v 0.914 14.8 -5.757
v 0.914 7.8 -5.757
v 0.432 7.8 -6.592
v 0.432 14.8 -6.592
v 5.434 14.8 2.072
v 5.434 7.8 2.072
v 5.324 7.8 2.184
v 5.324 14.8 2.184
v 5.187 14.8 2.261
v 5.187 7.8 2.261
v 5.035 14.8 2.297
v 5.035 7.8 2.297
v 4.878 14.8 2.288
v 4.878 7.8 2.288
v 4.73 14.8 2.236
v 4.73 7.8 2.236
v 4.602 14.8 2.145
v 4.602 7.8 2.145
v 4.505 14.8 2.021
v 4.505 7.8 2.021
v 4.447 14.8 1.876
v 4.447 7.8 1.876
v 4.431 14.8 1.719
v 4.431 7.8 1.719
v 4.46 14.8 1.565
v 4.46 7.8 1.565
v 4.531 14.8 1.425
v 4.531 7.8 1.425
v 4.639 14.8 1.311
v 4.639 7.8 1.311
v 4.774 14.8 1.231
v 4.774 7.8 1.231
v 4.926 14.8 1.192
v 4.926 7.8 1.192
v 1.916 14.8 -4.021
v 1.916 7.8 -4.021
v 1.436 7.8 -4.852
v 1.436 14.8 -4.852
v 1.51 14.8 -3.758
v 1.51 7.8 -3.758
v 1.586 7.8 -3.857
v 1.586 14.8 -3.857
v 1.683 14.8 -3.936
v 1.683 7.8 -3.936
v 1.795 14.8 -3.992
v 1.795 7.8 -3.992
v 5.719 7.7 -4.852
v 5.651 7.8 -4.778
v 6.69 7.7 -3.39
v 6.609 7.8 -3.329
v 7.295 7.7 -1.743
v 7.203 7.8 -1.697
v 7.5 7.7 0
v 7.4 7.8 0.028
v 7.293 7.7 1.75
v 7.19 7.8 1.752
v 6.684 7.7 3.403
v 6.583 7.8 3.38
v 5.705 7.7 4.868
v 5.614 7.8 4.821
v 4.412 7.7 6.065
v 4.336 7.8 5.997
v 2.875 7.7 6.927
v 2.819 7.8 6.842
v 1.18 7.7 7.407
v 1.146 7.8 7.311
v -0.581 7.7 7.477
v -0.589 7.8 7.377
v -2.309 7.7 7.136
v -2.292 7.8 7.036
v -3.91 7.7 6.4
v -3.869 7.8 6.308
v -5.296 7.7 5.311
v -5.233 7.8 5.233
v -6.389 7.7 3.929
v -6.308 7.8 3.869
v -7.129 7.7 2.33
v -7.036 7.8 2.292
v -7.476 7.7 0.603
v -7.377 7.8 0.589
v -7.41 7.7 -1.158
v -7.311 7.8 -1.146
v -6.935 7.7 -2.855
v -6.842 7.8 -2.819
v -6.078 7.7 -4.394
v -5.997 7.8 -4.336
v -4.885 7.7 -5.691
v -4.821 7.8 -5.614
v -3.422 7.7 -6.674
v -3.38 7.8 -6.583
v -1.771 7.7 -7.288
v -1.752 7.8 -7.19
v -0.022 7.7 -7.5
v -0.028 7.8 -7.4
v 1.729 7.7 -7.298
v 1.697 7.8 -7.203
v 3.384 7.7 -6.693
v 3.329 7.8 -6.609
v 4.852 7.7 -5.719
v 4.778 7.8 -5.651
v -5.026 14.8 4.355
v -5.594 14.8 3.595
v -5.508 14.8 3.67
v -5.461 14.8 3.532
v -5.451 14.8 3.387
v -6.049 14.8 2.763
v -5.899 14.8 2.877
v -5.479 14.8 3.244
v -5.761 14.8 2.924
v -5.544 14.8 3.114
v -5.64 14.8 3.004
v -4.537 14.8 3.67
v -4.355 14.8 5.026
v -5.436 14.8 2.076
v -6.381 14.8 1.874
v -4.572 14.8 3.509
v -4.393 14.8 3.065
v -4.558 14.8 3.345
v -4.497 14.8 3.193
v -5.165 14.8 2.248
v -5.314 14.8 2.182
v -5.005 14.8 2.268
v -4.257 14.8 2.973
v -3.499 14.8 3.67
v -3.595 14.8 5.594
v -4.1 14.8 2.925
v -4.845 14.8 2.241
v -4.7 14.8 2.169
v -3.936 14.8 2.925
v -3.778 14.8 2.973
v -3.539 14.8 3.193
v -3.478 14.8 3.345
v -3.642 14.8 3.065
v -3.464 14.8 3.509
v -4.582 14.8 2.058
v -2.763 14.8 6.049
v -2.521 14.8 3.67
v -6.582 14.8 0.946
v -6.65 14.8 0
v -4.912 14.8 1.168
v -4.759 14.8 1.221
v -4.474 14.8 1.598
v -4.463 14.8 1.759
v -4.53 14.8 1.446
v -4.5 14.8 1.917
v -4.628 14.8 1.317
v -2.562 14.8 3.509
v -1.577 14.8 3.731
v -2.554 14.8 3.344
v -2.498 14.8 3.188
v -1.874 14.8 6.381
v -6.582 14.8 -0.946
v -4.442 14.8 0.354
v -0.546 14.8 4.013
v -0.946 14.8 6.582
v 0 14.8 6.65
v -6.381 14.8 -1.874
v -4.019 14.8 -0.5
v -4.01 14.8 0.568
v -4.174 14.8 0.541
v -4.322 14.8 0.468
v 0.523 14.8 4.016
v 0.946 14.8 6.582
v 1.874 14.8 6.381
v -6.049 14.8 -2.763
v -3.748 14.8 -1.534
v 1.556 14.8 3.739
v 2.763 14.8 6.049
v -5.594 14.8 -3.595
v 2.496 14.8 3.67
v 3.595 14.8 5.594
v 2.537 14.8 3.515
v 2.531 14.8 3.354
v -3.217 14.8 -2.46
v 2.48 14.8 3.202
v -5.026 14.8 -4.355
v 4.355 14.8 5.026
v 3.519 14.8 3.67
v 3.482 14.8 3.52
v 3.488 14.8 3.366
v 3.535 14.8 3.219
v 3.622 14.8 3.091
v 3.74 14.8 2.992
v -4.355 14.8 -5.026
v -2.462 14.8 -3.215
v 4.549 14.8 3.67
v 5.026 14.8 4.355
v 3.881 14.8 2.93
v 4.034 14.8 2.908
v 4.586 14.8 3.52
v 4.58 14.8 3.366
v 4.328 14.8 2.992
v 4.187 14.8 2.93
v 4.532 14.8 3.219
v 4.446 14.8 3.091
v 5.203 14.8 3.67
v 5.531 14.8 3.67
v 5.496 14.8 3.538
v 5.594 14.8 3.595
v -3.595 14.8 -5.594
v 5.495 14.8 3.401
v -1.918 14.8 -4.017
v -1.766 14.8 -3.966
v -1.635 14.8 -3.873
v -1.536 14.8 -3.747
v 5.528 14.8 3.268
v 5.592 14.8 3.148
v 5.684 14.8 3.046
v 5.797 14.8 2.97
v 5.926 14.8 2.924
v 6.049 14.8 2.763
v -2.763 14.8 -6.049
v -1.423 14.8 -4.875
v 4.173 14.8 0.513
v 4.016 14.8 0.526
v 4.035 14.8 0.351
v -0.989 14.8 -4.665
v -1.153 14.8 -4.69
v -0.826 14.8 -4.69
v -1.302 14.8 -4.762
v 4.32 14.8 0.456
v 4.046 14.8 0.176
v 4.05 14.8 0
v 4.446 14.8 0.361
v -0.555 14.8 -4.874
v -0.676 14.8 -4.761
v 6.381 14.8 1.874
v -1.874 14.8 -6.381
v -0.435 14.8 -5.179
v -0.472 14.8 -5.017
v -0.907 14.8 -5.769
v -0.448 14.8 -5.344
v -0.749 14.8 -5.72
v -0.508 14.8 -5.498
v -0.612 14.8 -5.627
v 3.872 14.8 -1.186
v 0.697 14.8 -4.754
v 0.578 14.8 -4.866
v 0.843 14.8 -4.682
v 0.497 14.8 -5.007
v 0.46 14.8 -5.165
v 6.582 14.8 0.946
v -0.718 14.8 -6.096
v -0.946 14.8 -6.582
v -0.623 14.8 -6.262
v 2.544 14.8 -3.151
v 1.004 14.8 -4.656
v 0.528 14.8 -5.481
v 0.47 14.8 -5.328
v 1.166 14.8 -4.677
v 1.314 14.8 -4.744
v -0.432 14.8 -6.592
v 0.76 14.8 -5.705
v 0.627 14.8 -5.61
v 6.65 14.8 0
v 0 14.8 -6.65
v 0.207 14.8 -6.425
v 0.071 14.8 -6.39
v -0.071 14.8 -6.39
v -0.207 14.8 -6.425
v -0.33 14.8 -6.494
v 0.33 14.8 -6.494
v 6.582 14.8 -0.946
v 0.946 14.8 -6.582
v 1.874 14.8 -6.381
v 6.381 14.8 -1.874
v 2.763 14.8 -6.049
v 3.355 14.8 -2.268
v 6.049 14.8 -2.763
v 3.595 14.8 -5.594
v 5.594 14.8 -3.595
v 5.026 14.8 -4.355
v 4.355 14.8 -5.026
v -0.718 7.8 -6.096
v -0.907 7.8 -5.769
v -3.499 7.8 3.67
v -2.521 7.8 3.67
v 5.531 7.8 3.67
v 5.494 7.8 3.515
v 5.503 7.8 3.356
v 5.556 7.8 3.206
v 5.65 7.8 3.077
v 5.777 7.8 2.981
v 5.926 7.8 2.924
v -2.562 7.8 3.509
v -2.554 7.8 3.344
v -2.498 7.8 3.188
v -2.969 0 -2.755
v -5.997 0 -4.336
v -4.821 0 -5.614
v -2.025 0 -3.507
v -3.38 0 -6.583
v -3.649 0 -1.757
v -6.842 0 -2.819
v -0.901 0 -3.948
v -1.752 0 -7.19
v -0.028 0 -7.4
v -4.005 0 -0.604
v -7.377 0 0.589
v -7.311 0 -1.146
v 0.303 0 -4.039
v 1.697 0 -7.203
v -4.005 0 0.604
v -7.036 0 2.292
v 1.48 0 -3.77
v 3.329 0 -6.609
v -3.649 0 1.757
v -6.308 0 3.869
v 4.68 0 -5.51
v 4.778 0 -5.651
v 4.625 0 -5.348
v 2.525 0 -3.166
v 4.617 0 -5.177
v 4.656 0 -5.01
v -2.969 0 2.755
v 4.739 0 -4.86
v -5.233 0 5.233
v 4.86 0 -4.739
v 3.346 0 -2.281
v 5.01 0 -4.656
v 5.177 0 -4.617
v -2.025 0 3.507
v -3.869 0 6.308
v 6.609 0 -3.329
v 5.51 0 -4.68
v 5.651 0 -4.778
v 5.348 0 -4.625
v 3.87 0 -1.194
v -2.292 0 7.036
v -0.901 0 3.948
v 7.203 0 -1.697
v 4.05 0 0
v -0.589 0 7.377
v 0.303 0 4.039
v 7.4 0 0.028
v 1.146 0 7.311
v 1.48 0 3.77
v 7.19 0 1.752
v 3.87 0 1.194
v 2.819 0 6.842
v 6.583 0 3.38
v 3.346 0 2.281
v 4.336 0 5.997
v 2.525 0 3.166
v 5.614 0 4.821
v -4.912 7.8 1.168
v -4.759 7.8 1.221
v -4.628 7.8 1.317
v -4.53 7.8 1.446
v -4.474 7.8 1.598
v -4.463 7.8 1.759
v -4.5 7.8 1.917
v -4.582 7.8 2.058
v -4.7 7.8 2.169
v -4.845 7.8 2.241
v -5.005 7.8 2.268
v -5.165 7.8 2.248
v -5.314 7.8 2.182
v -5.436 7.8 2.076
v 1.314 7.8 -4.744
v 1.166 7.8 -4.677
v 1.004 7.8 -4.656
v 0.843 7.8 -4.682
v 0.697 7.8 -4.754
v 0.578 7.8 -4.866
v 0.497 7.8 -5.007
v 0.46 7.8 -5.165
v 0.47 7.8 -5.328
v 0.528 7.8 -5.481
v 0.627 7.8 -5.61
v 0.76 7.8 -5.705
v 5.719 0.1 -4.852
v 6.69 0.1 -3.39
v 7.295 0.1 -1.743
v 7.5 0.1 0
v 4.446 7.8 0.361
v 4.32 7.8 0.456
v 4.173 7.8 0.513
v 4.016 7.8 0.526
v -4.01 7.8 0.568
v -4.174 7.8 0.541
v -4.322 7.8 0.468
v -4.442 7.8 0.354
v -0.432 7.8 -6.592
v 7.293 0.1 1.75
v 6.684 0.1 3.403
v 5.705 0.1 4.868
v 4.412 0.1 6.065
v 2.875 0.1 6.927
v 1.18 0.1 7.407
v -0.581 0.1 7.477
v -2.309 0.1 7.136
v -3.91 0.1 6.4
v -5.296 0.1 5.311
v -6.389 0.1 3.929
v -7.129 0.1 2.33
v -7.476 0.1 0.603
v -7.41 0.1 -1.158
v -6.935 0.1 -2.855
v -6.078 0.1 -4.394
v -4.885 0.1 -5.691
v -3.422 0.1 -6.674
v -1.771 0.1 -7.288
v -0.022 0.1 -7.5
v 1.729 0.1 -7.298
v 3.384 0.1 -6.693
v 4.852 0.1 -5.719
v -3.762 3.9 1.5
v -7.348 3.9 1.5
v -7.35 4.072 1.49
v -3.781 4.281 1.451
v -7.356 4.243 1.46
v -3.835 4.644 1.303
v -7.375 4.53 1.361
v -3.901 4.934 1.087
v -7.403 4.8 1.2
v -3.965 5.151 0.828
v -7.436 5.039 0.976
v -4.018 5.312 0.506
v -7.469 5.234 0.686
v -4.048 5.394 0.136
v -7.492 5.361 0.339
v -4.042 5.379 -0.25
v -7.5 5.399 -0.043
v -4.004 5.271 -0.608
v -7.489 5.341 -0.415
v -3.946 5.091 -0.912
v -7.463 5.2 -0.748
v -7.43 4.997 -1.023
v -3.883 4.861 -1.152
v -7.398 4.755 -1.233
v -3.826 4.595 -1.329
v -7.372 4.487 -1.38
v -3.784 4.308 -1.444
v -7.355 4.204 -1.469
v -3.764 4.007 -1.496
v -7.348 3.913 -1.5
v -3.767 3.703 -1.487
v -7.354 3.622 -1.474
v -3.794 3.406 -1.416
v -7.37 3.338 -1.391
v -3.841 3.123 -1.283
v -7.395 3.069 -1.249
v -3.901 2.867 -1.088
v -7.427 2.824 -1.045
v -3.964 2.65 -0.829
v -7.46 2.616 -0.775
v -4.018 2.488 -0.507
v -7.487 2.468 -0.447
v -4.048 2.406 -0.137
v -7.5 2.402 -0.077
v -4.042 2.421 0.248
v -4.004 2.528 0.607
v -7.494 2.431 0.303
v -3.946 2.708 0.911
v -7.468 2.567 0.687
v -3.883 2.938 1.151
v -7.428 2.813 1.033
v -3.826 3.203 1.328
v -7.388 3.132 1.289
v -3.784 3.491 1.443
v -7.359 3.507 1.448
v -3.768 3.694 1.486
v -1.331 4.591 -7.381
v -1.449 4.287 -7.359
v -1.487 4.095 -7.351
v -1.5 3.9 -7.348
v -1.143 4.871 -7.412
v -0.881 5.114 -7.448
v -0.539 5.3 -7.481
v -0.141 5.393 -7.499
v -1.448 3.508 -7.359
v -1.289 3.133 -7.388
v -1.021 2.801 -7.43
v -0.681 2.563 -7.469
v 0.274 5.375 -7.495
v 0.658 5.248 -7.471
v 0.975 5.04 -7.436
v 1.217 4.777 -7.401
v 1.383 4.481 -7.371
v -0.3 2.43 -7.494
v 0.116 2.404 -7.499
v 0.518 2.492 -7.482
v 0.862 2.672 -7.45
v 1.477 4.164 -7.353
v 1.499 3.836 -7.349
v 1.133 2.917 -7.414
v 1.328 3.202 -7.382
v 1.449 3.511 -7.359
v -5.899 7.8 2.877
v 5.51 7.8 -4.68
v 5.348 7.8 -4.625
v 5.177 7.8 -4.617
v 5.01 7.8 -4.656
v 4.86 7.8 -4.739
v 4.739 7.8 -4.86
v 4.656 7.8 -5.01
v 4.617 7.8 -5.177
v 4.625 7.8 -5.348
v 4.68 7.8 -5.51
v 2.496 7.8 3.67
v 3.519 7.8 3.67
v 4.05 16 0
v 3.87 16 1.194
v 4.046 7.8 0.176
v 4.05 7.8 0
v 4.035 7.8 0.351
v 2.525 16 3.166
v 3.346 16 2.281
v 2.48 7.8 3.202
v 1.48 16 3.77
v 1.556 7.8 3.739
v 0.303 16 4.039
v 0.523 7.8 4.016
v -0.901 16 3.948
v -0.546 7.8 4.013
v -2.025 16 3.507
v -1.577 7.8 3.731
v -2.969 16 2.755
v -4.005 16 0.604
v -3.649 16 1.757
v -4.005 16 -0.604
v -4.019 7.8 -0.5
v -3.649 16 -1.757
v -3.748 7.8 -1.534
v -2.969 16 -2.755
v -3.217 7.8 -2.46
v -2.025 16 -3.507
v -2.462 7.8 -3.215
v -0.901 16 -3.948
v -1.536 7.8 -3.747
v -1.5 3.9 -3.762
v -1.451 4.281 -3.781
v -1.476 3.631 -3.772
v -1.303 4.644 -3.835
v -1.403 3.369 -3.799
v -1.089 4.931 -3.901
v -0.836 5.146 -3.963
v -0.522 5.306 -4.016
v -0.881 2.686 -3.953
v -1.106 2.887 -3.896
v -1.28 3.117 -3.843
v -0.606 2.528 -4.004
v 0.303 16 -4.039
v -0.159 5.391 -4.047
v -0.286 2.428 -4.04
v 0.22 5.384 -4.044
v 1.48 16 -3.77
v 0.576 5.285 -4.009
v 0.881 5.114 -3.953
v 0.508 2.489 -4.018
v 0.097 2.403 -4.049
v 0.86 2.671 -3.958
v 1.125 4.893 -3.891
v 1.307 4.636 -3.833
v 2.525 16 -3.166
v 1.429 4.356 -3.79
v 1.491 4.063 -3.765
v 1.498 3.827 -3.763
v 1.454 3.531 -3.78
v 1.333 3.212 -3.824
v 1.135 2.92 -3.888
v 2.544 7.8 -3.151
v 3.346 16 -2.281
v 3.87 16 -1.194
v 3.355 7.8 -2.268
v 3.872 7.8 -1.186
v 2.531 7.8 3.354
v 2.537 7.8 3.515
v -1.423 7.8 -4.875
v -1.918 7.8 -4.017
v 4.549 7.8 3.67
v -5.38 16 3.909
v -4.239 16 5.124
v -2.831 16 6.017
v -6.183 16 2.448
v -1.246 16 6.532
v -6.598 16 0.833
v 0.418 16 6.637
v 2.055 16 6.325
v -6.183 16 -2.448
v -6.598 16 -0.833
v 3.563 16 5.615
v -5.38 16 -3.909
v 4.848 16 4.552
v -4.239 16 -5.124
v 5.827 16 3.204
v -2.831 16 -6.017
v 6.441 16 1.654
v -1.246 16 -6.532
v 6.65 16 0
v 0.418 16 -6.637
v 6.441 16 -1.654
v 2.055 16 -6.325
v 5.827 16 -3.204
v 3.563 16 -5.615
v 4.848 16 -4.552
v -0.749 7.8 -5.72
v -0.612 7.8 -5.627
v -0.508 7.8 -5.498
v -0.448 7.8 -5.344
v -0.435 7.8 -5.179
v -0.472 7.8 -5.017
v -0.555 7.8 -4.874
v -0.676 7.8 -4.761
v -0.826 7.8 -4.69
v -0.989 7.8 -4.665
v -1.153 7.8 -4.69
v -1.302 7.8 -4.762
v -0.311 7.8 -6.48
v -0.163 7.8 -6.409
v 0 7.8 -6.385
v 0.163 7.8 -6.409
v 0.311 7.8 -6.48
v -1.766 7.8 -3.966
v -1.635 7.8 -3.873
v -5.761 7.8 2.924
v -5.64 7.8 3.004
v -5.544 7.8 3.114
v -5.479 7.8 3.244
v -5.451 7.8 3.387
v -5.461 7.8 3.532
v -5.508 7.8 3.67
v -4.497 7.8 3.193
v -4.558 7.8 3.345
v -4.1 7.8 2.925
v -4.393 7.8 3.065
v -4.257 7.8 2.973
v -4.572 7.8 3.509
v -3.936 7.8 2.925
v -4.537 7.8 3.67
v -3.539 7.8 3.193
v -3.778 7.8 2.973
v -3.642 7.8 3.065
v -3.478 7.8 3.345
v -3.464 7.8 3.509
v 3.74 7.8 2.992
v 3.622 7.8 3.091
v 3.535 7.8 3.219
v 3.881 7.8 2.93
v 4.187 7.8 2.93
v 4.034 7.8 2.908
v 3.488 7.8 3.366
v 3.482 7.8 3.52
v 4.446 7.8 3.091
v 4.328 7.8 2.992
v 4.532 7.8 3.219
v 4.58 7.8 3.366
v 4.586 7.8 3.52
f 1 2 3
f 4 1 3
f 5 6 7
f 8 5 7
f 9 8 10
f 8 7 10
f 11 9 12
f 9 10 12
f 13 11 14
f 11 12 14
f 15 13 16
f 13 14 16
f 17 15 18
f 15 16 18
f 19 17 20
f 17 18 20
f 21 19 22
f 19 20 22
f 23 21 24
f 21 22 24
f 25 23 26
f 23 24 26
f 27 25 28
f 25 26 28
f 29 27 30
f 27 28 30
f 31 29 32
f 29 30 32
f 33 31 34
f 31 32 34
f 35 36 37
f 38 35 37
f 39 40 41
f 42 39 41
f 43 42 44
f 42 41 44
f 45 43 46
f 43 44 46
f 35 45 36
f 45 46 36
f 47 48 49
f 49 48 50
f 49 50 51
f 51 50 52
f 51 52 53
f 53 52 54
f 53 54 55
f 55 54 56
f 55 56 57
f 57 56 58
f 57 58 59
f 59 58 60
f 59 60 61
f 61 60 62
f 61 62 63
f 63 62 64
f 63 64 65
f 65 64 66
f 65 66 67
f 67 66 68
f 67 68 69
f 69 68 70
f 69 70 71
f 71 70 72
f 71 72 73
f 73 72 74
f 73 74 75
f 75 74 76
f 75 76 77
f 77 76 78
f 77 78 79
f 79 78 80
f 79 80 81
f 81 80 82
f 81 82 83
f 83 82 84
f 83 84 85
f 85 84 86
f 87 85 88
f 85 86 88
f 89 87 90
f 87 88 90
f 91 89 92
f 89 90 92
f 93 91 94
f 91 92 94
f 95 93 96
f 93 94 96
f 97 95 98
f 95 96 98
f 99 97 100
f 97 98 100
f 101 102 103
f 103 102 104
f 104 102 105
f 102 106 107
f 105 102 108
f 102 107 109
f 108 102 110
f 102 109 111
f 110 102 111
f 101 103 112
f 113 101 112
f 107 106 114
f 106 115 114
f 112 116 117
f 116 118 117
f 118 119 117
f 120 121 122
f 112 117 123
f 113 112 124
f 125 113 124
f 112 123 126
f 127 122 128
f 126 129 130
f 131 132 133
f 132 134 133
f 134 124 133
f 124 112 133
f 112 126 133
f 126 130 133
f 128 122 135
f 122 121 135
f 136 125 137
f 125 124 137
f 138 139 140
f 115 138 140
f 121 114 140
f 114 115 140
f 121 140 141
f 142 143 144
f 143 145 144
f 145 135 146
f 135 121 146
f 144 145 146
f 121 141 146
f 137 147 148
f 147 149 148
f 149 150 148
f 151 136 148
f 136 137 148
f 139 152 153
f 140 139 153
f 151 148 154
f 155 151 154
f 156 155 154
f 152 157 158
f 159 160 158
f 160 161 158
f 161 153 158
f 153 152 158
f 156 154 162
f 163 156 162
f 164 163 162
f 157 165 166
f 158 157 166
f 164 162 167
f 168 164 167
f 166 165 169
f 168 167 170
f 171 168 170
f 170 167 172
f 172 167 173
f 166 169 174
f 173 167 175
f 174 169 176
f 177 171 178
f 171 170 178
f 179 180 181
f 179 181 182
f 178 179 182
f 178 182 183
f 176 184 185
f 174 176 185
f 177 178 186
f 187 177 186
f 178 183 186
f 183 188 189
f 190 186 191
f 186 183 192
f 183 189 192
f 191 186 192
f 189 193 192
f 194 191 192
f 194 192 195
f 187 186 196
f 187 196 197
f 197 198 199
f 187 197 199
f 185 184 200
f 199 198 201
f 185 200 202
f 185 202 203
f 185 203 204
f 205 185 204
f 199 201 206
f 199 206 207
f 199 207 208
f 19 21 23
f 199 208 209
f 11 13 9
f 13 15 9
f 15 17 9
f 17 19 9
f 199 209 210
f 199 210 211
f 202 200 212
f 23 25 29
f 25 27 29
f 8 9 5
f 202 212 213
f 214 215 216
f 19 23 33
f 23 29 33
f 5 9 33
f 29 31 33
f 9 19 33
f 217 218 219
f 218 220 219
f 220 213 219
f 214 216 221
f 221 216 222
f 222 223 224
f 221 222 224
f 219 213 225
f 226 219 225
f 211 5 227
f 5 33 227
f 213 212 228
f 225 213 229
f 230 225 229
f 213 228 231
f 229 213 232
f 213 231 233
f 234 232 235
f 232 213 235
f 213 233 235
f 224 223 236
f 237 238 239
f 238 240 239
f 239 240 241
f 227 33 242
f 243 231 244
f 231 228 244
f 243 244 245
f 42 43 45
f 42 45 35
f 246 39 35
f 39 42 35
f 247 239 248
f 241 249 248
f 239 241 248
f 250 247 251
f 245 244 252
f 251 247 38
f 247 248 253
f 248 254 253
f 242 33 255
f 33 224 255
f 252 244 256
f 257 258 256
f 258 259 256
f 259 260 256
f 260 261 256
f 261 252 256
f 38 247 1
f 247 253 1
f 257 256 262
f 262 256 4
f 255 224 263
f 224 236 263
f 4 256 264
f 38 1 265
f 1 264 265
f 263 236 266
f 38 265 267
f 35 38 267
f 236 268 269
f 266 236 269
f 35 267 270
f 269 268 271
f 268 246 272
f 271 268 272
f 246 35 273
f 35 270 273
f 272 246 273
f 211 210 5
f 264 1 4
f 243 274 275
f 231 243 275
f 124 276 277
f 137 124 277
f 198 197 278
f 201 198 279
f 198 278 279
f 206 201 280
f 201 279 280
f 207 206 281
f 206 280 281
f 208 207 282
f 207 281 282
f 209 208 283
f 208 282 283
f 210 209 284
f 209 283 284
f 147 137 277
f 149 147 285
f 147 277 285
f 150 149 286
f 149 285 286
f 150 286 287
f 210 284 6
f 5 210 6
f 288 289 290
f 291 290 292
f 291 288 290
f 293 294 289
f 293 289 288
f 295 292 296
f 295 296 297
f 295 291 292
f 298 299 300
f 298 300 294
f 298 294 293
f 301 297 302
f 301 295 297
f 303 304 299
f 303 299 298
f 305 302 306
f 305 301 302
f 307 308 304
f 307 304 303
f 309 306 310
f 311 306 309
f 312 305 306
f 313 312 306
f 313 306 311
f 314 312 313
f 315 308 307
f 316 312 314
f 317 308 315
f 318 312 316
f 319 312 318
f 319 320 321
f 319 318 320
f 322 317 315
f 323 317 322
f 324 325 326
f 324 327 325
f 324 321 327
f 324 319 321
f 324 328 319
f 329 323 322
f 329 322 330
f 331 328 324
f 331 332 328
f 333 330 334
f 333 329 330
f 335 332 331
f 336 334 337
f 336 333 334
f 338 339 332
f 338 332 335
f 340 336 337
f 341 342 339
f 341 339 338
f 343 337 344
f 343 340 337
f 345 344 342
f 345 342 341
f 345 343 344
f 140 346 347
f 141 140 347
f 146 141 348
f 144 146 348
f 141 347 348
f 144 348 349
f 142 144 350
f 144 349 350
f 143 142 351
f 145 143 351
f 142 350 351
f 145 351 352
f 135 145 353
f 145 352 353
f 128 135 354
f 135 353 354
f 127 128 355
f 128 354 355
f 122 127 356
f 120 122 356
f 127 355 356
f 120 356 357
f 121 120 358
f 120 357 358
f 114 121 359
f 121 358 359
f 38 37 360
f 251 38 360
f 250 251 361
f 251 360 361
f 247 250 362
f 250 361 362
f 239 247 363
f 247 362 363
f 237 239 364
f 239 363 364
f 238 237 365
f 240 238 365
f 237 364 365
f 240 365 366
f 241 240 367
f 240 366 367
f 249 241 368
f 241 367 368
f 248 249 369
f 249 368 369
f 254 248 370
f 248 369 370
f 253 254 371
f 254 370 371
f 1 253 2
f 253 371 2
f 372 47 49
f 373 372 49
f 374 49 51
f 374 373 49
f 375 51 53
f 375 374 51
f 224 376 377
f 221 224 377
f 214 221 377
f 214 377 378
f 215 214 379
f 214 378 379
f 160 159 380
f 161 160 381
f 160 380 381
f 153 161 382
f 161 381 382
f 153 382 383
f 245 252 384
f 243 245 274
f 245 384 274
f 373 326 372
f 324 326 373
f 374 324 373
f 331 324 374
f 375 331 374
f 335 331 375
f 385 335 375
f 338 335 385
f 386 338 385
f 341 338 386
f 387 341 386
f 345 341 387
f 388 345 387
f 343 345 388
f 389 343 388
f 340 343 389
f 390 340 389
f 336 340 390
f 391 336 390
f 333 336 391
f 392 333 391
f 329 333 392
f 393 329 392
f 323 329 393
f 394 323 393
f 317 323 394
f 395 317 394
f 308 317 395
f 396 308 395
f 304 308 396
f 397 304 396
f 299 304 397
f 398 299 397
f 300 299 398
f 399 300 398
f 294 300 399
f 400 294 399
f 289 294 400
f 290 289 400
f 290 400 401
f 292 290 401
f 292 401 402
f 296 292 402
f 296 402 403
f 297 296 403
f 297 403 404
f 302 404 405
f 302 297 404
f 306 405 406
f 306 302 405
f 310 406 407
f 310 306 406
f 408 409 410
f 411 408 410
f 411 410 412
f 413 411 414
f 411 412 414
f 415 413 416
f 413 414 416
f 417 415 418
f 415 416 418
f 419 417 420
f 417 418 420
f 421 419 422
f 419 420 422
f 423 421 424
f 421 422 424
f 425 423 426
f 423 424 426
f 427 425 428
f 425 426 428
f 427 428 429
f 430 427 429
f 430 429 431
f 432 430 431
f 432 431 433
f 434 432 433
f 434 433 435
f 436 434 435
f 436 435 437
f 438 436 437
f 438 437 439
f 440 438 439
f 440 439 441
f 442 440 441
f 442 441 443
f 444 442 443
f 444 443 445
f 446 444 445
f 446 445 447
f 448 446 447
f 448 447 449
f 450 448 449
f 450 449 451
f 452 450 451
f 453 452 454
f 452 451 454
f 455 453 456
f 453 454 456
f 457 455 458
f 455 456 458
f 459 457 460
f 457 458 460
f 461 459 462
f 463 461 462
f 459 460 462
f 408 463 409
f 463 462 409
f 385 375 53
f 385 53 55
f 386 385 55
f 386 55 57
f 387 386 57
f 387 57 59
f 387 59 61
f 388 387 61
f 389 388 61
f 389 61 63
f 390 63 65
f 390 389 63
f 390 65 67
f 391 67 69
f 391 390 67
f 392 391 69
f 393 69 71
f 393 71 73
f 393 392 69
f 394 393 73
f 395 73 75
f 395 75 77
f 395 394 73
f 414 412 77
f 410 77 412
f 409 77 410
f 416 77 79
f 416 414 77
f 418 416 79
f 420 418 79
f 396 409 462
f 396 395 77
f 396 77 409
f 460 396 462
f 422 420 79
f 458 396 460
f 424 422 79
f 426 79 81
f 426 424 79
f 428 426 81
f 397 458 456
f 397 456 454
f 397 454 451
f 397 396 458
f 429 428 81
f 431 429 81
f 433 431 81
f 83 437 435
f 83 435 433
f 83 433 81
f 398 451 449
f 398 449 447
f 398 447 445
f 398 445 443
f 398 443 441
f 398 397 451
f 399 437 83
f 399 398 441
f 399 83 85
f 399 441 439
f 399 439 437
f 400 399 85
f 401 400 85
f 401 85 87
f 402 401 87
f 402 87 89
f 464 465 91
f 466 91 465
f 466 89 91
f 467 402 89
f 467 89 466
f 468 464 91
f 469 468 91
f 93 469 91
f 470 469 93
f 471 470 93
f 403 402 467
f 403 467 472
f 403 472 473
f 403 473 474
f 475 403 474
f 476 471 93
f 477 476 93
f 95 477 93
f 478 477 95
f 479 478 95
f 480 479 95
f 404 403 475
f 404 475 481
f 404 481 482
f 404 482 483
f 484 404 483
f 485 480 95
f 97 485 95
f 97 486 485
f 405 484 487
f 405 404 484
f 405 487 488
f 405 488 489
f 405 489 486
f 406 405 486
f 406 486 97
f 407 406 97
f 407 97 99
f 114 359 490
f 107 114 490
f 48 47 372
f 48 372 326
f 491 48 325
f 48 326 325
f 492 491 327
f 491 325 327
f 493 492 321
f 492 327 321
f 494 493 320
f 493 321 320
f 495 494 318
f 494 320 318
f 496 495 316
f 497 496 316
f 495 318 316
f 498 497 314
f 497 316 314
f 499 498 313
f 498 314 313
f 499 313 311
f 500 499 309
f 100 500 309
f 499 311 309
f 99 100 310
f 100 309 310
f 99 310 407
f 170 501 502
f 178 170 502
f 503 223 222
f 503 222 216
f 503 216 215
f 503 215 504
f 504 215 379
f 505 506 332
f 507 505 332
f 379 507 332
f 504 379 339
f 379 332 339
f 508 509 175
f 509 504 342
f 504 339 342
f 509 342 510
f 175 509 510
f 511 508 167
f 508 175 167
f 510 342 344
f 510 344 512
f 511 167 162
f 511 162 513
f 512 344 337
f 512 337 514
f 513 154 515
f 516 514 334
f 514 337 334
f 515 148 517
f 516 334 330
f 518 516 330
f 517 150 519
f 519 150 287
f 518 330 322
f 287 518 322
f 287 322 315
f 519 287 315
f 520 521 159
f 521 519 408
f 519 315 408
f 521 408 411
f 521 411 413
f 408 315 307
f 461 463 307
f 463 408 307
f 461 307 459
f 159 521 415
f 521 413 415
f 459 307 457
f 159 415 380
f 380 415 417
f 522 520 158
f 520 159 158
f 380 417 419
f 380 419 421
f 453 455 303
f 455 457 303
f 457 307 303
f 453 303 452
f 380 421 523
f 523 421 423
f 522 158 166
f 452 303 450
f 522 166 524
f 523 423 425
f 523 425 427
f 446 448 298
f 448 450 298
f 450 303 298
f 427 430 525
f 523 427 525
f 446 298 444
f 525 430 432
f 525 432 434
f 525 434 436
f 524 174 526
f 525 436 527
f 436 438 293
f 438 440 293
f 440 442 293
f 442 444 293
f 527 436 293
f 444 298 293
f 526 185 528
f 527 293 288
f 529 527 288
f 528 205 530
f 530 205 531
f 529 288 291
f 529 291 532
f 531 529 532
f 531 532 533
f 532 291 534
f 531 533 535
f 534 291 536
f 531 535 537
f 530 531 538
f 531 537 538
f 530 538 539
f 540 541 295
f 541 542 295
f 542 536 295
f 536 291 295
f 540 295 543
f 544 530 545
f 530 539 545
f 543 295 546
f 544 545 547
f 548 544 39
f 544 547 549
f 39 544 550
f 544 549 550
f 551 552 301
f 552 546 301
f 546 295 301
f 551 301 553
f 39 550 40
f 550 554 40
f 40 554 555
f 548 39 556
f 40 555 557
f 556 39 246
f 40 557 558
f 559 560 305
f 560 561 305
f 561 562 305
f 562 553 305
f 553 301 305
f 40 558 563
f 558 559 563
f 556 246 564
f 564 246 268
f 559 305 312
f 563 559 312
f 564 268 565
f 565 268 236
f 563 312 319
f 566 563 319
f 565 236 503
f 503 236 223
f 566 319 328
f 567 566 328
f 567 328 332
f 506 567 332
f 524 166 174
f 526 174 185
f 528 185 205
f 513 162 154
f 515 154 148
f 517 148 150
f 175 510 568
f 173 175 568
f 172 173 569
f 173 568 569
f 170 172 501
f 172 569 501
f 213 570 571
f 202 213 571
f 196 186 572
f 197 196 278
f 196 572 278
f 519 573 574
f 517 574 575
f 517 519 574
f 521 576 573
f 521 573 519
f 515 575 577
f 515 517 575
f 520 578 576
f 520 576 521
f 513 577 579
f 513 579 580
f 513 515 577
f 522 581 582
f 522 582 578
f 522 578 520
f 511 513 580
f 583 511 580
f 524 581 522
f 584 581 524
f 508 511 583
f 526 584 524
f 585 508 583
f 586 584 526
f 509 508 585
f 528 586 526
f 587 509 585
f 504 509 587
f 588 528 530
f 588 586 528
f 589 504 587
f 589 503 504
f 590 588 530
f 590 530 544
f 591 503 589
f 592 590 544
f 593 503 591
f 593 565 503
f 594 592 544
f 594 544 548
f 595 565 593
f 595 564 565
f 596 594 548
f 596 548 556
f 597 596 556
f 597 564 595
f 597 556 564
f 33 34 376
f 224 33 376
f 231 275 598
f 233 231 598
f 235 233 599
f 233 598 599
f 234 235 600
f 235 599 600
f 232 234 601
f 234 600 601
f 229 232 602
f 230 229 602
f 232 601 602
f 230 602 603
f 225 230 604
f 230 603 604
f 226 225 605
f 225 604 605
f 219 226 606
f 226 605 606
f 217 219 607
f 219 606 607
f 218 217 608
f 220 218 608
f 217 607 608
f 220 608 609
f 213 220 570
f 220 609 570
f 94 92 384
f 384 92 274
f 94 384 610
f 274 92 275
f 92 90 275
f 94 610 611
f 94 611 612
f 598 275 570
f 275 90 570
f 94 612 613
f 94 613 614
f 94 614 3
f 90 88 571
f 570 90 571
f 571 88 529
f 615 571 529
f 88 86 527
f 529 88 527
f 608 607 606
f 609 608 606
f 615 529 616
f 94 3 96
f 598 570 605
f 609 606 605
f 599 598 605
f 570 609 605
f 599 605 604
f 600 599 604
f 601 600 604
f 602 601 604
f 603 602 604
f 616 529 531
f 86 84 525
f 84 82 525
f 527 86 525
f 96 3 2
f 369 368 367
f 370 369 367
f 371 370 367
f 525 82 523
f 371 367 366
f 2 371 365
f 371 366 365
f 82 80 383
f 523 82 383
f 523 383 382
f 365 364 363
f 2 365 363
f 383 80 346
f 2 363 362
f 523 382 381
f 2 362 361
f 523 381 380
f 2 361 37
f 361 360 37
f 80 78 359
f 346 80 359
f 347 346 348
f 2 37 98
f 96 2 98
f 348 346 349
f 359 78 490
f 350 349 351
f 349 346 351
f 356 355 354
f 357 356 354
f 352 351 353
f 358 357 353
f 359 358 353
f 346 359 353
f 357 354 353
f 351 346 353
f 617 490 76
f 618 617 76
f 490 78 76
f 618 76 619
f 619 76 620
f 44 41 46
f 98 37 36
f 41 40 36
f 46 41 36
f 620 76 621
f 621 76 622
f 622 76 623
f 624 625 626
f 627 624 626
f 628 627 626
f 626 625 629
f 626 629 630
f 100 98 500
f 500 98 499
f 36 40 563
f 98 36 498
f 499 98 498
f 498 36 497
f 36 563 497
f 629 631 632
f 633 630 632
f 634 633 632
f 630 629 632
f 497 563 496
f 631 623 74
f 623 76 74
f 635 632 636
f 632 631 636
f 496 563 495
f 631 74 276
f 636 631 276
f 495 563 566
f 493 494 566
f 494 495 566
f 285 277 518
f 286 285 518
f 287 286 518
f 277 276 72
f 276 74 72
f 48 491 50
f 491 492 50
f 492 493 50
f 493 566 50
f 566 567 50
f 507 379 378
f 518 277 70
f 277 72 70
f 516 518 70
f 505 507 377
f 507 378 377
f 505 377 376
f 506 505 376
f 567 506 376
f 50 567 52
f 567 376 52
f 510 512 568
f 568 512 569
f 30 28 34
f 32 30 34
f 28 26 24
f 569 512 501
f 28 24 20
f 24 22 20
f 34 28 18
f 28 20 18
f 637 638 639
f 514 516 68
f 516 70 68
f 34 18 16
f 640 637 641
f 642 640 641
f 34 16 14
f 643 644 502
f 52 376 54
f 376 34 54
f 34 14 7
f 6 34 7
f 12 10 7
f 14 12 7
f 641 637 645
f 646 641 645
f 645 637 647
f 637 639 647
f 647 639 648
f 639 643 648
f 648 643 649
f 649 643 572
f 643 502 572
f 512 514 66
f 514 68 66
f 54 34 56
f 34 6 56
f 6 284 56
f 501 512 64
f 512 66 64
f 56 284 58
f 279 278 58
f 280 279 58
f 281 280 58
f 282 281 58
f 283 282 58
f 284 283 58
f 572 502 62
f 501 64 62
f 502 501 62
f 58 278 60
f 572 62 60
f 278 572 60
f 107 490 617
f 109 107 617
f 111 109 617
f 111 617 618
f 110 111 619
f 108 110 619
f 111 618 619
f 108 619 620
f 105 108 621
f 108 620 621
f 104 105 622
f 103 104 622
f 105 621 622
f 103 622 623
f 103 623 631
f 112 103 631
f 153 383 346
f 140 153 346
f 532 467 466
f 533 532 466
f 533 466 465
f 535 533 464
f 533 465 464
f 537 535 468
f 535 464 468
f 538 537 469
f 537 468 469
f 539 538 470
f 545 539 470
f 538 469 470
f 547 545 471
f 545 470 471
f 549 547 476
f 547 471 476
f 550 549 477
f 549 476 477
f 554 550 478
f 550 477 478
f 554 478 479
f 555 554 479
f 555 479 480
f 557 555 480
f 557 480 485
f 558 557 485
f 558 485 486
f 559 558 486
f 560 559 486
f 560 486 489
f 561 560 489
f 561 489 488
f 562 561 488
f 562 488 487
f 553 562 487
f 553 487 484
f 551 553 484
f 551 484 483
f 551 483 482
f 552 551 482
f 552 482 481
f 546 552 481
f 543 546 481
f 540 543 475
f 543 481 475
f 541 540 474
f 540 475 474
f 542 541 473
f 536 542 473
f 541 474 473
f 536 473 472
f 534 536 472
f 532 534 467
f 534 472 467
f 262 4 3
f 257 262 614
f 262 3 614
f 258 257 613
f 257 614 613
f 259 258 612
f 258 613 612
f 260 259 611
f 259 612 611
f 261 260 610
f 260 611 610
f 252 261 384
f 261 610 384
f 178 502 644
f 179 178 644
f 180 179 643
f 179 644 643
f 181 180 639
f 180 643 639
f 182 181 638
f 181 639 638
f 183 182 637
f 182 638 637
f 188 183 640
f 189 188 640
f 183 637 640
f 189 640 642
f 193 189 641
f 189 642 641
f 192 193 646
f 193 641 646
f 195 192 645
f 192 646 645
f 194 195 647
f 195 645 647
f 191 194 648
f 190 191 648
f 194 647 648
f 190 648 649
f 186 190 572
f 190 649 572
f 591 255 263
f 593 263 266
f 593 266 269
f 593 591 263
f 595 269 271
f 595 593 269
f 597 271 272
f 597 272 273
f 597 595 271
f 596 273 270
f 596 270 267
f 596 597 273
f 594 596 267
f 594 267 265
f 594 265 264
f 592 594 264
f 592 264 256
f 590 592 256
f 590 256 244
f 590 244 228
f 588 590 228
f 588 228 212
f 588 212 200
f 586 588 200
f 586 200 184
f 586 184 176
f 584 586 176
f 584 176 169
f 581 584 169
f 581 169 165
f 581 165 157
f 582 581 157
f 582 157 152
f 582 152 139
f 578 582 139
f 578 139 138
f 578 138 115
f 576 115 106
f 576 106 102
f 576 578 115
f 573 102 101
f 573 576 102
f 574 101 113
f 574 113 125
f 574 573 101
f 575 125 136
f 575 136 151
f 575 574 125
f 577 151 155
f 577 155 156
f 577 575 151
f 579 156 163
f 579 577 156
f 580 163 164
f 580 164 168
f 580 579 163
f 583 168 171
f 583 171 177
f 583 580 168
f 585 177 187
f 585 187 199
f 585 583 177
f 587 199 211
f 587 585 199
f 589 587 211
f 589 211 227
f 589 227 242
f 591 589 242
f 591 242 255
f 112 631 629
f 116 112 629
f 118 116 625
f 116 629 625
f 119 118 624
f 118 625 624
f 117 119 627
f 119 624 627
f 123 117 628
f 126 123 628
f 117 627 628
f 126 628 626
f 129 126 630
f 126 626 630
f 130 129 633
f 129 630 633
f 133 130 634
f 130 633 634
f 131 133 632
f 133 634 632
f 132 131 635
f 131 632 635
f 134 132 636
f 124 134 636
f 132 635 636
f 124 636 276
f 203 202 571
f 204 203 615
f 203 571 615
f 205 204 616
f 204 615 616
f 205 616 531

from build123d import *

# Parameters (mm, degrees)
P_IDAT_START            = 7.8
SKICA1_R                = 2.5
P_IDAT_VYSUNUT_M1_DEPTH = 7
SKICA2_R                = 3.5
SKICA2_R_2              = 2.5
P_IDAT_VYSUNUT_M2_DEPTH = 7.8
SKICA3_R                = 3.5
SKICA3_R_2              = 2.5
P_IDAT_VYSUNUT_M3_DEPTH = 1.2
SKICA5_R                = 7.5
SKICA5_R_2              = 3.5
P_IDAT_VYSUNUT_M4_DEPTH = 1.2
SKICA6_R                = 7.5
SKICA6_R_2              = 3.5
P_IDAT_VYSUNUT_M5_DEPTH = 7.8
ZKOSEN_1_SIZE           = 0.1
ZKOSEN_2_SIZE           = 0.1
ZKOSEN_3_SIZE           = 0.1
SKETCH8_OUTSIDE_W       = 22.314
SKETCH8_OUTSIDE_H       = 22.314
SKETCH8_OUTSIDE_R       = 6.65
CUT_EXTRUDE2_DEPTH      = 5
SKETCH19_R              = 1.5
CUT_EXTRUDE6_DEPTH      = 5
SKETCH20_R              = 1.5
CUT_EXTRUDE7_DEPTH      = 5
SKETCH7_R               = 4.05
CUT_EXTRUDE9_DEPTH      = 20
SKETCH27_R              = 7.4
CUT_EXTRUDE12_DEPTH     = 7
BOSS_EXTRUDE2_DEPTH     = 7.1
SKETCH28_R              = 4.05
CUT_EXTRUDE13_DEPTH     = 30
SKETCH30_R              = 0.617994848
CUT_EXTRUDE15_DEPTH     = 30


with BuildPart() as part:
    # Skica1 → Přidat vysunutím1 (new body)
    with BuildSketch(Plane(origin=(0, 0, 0), x_dir=(1, 0, 0), z_dir=(0, 1, 0)).offset(P_IDAT_START)):
        with BuildLine():
            ThreePointArc((-5.730143195, 1.098270155), (-5.09645097, 1.530497044), (-5.387174672, 2.240331989))
            ThreePointArc((-5.387174672, 2.240331989), (-5.468060657, 2.292707421), (-5.540463547, 2.356296335))
            ThreePointArc((-5.540463547, 2.356296335), (-5.573874331, 2.399596558), (-5.596043873, 2.44959357))
            ThreePointArc((-5.596043873, 2.44959357), (-5.50369925, 2.650567912), (-5.404139771, 2.848067596))
            ThreePointArc((-5.404139771, 2.848067596), (-5.351227535, 2.86190541), (-5.296542742, 2.862779021))
            ThreePointArc((-5.296542742, 2.862779021), (-5.201685094, 2.845815675), (-5.110305882, 2.815228615))
            ThreePointArc((-5.110305882, 2.815228615), (-4.374063308, 3.030479148), (-4.431206919, 3.795410862))
            ThreePointArc((-4.431206919, 3.795410862), (-4.491949163, 3.870218002), (-4.541158349, 3.953068377))
            ThreePointArc((-4.541158349, 3.953068377), (-4.559553388, 4.004573836), (-4.565187949, 4.058974585))
            ThreePointArc((-4.565187949, 4.058974585), (-4.415258506, 4.221576484), (-4.259541056, 4.378644275))
            ThreePointArc((-4.259541056, 4.378644275), (-4.204942409, 4.375454038), (-4.15266412, 4.359386362))
            ThreePointArc((-4.15266412, 4.359386362), (-4.067691098, 4.313940635), (-3.990236225, 4.256612884))
            ThreePointArc((-3.990236225, 4.256612884), (-3.223511854, 4.233816838), (-3.041481758, 4.978968476))
            ThreePointArc((-3.041481758, 4.978968476), (-3.076134388, 5.06888468), (-3.097332931, 5.162886543))
            ThreePointArc((-3.097332931, 5.162886543), (-3.09891159, 5.217555525), (-3.08745962, 5.271034888))
            ThreePointArc((-3.08745962, 5.271034888), (-2.894621497, 5.379347737), (-2.697988784, 5.480608745))
            ThreePointArc((-2.697988784, 5.480608745), (-2.647048223, 5.460702739), (-2.6022938, 5.429266591))
            ThreePointArc((-2.6022938, 5.429266591), (-2.535523156, 5.359787029), (-2.479574443, 5.281330225))
            ThreePointArc((-2.479574443, 5.281330225), (-1.7574206, 5.022719037), (-1.354035171, 5.675149965))
            ThreePointArc((-1.354035171, 5.675149965), (-1.359206146, 5.771373608), (-1.350318985, 5.867325402))
            ThreePointArc((-1.350318985, 5.867325402), (-1.334926735, 5.919806527), (-1.307509232, 5.967129569))
            ThreePointArc((-1.307509232, 5.967129569), (-1.090638767, 6.010550954), (-0.872338572, 6.046093045))
            ThreePointArc((-0.872338572, 6.046093045), (-0.830042514, 6.01141981), (-0.797192832, 5.967692379))
            ThreePointArc((-0.797192832, 5.967692379), (-0.755160541, 5.880980125), (-0.726194639, 5.789074167))
            ThreePointArc((-0.726194639, 5.789074167), (-0.119300773, 5.319962501), (0.465953812, 5.815808234))
            ThreePointArc((0.465953812, 5.815808234), (0.490770664, 5.908920276), (0.528873591, 5.997429571))
            ThreePointArc((0.528873591, 5.997429571), (0.55973005, 6.04258562), (0.600429269, 6.079120034))
            ThreePointArc((0.600429269, 6.079120034), (0.820103284, 6.053399565), (1.038702217, 6.019743632))
            ThreePointArc((1.038702217, 6.019743632), (1.06821354, 5.973697225), (1.085942924, 5.921958857))
            ThreePointArc((1.085942924, 5.921958857), (1.099122448, 5.826501911), (1.098270155, 5.730143195))
            ThreePointArc((1.098270155, 5.730143195), (1.530497044, 5.09645097), (2.240331989, 5.387174672))
            ThreePointArc((2.240331989, 5.387174672), (2.292707421, 5.468060657), (2.356296335, 5.540463547))
            ThreePointArc((2.356296335, 5.540463547), (2.399596558, 5.573874331), (2.44959357, 5.596043873))
            ThreePointArc((2.44959357, 5.596043873), (2.650567912, 5.50369925), (2.848067596, 5.404139771))
            ThreePointArc((2.848067596, 5.404139771), (2.86190541, 5.351227535), (2.862779021, 5.296542742))
            ThreePointArc((2.862779021, 5.296542742), (2.845815675, 5.201685094), (2.815228615, 5.110305882))
            ThreePointArc((2.815228615, 5.110305882), (3.030479148, 4.374063308), (3.795410862, 4.431206919))
            ThreePointArc((3.795410862, 4.431206919), (3.870218002, 4.491949163), (3.953068377, 4.541158349))
            ThreePointArc((3.953068377, 4.541158349), (4.004573836, 4.559553388), (4.058974585, 4.565187949))
            ThreePointArc((4.058974585, 4.565187949), (4.221576484, 4.415258506), (4.378644275, 4.259541056))
            ThreePointArc((4.378644275, 4.259541056), (4.375454038, 4.204942409), (4.359386362, 4.15266412))
            ThreePointArc((4.359386362, 4.15266412), (4.313940635, 4.067691098), (4.256612884, 3.990236225))
            ThreePointArc((4.256612884, 3.990236225), (4.233816838, 3.223511854), (4.978968476, 3.041481758))
            ThreePointArc((4.978968476, 3.041481758), (5.06888468, 3.076134388), (5.162886543, 3.097332931))
            ThreePointArc((5.162886543, 3.097332931), (5.217555525, 3.09891159), (5.271034888, 3.08745962))
            ThreePointArc((5.271034888, 3.08745962), (5.379347737, 2.894621497), (5.480608745, 2.697988784))
            ThreePointArc((5.480608745, 2.697988784), (5.460702739, 2.647048223), (5.429266591, 2.6022938))
            ThreePointArc((5.429266591, 2.6022938), (5.359787029, 2.535523156), (5.281330225, 2.479574443))
            ThreePointArc((5.281330225, 2.479574443), (5.022719037, 1.7574206), (5.675149965, 1.354035171))
            ThreePointArc((5.675149965, 1.354035171), (5.771373608, 1.359206146), (5.867325402, 1.350318985))
            ThreePointArc((5.867325402, 1.350318985), (5.919806527, 1.334926735), (5.967129569, 1.307509232))
            ThreePointArc((5.967129569, 1.307509232), (6.010550954, 1.090638767), (6.046093045, 0.872338572))
            ThreePointArc((6.046093045, 0.872338572), (6.01141981, 0.830042514), (5.967692379, 0.797192832))
            ThreePointArc((5.967692379, 0.797192832), (5.880980125, 0.755160541), (5.789074167, 0.726194639))
            ThreePointArc((5.789074167, 0.726194639), (5.319962501, 0.119300773), (5.815808234, -0.465953812))
            ThreePointArc((5.815808234, -0.465953812), (5.908920276, -0.490770664), (5.997429571, -0.528873591))
            ThreePointArc((5.997429571, -0.528873591), (6.04258562, -0.55973005), (6.079120034, -0.600429269))
            ThreePointArc((6.079120034, -0.600429269), (6.053399565, -0.820103284), (6.019743632, -1.038702217))
            ThreePointArc((6.019743632, -1.038702217), (5.973697225, -1.06821354), (5.921958857, -1.085942924))
            ThreePointArc((5.921958857, -1.085942924), (5.826501911, -1.099122448), (5.730143195, -1.098270155))
            ThreePointArc((5.730143195, -1.098270155), (5.09645097, -1.530497044), (5.387174672, -2.240331989))
            ThreePointArc((5.387174672, -2.240331989), (5.468060657, -2.292707421), (5.540463547, -2.356296335))
            ThreePointArc((5.540463547, -2.356296335), (5.573874331, -2.399596558), (5.596043873, -2.44959357))
            ThreePointArc((5.596043873, -2.44959357), (5.50369925, -2.650567911), (5.404139771, -2.848067596))
            ThreePointArc((5.404139771, -2.848067596), (5.351227535, -2.86190541), (5.296542742, -2.862779021))
            ThreePointArc((5.296542742, -2.862779021), (5.201685094, -2.845815675), (5.110305882, -2.815228615))
            ThreePointArc((5.110305882, -2.815228615), (4.374063308, -3.030479148), (4.431206919, -3.795410862))
            ThreePointArc((4.431206919, -3.795410862), (4.491949163, -3.870218002), (4.541158349, -3.953068377))
            ThreePointArc((4.541158349, -3.953068377), (4.559553388, -4.004573836), (4.565187949, -4.058974585))
            ThreePointArc((4.565187949, -4.058974585), (4.415258506, -4.221576484), (4.259541056, -4.378644275))
            ThreePointArc((4.259541056, -4.378644275), (4.204942409, -4.375454038), (4.15266412, -4.359386362))
            ThreePointArc((4.15266412, -4.359386362), (4.067691098, -4.313940635), (3.990236225, -4.256612884))
            ThreePointArc((3.990236225, -4.256612884), (3.223511854, -4.233816838), (3.041481758, -4.978968476))
            ThreePointArc((3.041481758, -4.978968476), (3.076134388, -5.06888468), (3.097332931, -5.162886543))
            ThreePointArc((3.097332931, -5.162886543), (3.09891159, -5.217555525), (3.08745962, -5.271034888))
            ThreePointArc((3.08745962, -5.271034888), (2.894621497, -5.379347737), (2.697988784, -5.480608745))
            ThreePointArc((2.697988784, -5.480608745), (2.647048223, -5.460702739), (2.6022938, -5.429266591))
            ThreePointArc((2.6022938, -5.429266591), (2.535523156, -5.359787029), (2.479574443, -5.281330225))
            ThreePointArc((2.479574443, -5.281330225), (1.7574206, -5.022719037), (1.354035171, -5.675149965))
            ThreePointArc((1.354035171, -5.675149965), (1.359206146, -5.771373608), (1.350318985, -5.867325402))
            ThreePointArc((1.350318985, -5.867325402), (1.334926735, -5.919806527), (1.307509232, -5.967129569))
            ThreePointArc((1.307509232, -5.967129569), (1.090638767, -6.010550954), (0.872338572, -6.046093045))
            ThreePointArc((0.872338572, -6.046093045), (0.830042514, -6.01141981), (0.797192832, -5.967692379))
            ThreePointArc((0.797192832, -5.967692379), (0.755160541, -5.880980125), (0.726194639, -5.789074167))
            ThreePointArc((0.726194639, -5.789074167), (0.119300773, -5.319962501), (-0.465953812, -5.815808234))
            ThreePointArc((-0.465953812, -5.815808234), (-0.490770664, -5.908920276), (-0.528873591, -5.997429571))
            ThreePointArc((-0.528873591, -5.997429571), (-0.55973005, -6.04258562), (-0.600429269, -6.079120034))
            ThreePointArc((-0.600429269, -6.079120034), (-0.820103284, -6.053399565), (-1.038702217, -6.019743632))
            ThreePointArc((-1.038702217, -6.019743632), (-1.06821354, -5.973697225), (-1.085942924, -5.921958857))
            ThreePointArc((-1.085942924, -5.921958857), (-1.099122448, -5.826501911), (-1.098270155, -5.730143195))
            ThreePointArc((-1.098270155, -5.730143195), (-1.530497044, -5.09645097), (-2.240331989, -5.387174672))
            ThreePointArc((-2.240331989, -5.387174672), (-2.292707421, -5.468060657), (-2.356296335, -5.540463547))
            ThreePointArc((-2.356296335, -5.540463547), (-2.399596558, -5.573874331), (-2.44959357, -5.596043873))
            ThreePointArc((-2.44959357, -5.596043873), (-2.650567912, -5.50369925), (-2.848067596, -5.404139771))
            ThreePointArc((-2.848067596, -5.404139771), (-2.86190541, -5.351227535), (-2.862779021, -5.296542742))
            ThreePointArc((-2.862779021, -5.296542742), (-2.845815675, -5.201685094), (-2.815228615, -5.110305882))
            ThreePointArc((-2.815228615, -5.110305882), (-3.030479148, -4.374063308), (-3.795410862, -4.431206919))
            ThreePointArc((-3.795410862, -4.431206919), (-3.870218002, -4.491949163), (-3.953068377, -4.541158349))
            ThreePointArc((-3.953068377, -4.541158349), (-4.004573836, -4.559553388), (-4.058974585, -4.565187949))
            ThreePointArc((-4.058974585, -4.565187949), (-4.221576484, -4.415258506), (-4.378644275, -4.259541056))
            ThreePointArc((-4.378644275, -4.259541056), (-4.375454038, -4.204942409), (-4.359386362, -4.15266412))
            ThreePointArc((-4.359386362, -4.15266412), (-4.313940635, -4.067691098), (-4.256612884, -3.990236225))
            ThreePointArc((-4.256612884, -3.990236225), (-4.233816838, -3.223511854), (-4.978968476, -3.041481758))
            ThreePointArc((-4.978968476, -3.041481758), (-5.06888468, -3.076134388), (-5.162886543, -3.097332931))
            ThreePointArc((-5.162886543, -3.097332931), (-5.217555525, -3.09891159), (-5.271034888, -3.08745962))
            ThreePointArc((-5.271034888, -3.08745962), (-5.379347737, -2.894621497), (-5.480608745, -2.697988784))
            ThreePointArc((-5.480608745, -2.697988784), (-5.460702739, -2.647048223), (-5.429266591, -2.6022938))
            ThreePointArc((-5.429266591, -2.6022938), (-5.359787029, -2.535523156), (-5.281330225, -2.479574443))
            ThreePointArc((-5.281330225, -2.479574443), (-5.022719037, -1.7574206), (-5.675149965, -1.354035171))
            ThreePointArc((-5.675149965, -1.354035171), (-5.771373608, -1.359206146), (-5.867325402, -1.350318985))
            ThreePointArc((-5.867325402, -1.350318985), (-5.919806527, -1.334926735), (-5.967129569, -1.307509232))
            ThreePointArc((-5.967129569, -1.307509232), (-6.010550954, -1.090638767), (-6.046093045, -0.872338572))
            ThreePointArc((-6.046093045, -0.872338572), (-6.01141981, -0.830042514), (-5.967692379, -0.797192832))
            ThreePointArc((-5.967692379, -0.797192832), (-5.880980125, -0.755160541), (-5.789074167, -0.726194639))
            ThreePointArc((-5.789074167, -0.726194639), (-5.319962501, -0.119300773), (-5.815808234, 0.465953812))
            ThreePointArc((-5.815808234, 0.465953812), (-5.908920276, 0.490770664), (-5.997429571, 0.528873591))
            ThreePointArc((-5.997429571, 0.528873591), (-6.04258562, 0.55973005), (-6.079120034, 0.600429269))
            ThreePointArc((-6.079120034, 0.600429269), (-6.053399565, 0.820103284), (-6.019743632, 1.038702217))
            ThreePointArc((-6.019743632, 1.038702217), (-5.973697225, 1.06821354), (-5.921958857, 1.085942924))
            ThreePointArc((-5.921958857, 1.085942924), (-5.826501911, 1.099122448), (-5.730143195, 1.098270155))
        make_face()
        Circle(SKICA1_R, mode=Mode.SUBTRACT)
    extrude(amount=P_IDAT_VYSUNUT_M1_DEPTH)

    # Skica2 → Přidat vysunutím2 (add)
    with BuildSketch(Plane.XZ.offset(-7.8)):
        Circle(SKICA2_R)
        Circle(SKICA2_R_2, mode=Mode.SUBTRACT)
    extrude(amount=P_IDAT_VYSUNUT_M2_DEPTH)

    # Skica3 → Přidat vysunutím3 (add)
    with BuildSketch(Plane(origin=(0, 14.8, 0), x_dir=(1, 0, 0), z_dir=(0, 1, 0))):
        Circle(SKICA3_R)
        Circle(SKICA3_R_2, mode=Mode.SUBTRACT)
    extrude(amount=P_IDAT_VYSUNUT_M3_DEPTH)

    # Zkosení2
    zkosen_2_edges = [part.edges().sort_by_distance(p)[0] for p in [
        (-2.5, 0, 0),
        (-2.5, 16, 0),
    ]]
    chamfer(zkosen_2_edges, length=ZKOSEN_2_SIZE)


with BuildPart() as body_2:
    # Skica5 → Přidat vysunutím4 (new body)
    with BuildSketch(Plane(origin=(0, 16, 0), x_dir=(1, 0, 0), z_dir=(0, 1, 0))):
        Circle(SKICA5_R)
        Circle(SKICA5_R_2, mode=Mode.SUBTRACT)
    extrude(amount=-P_IDAT_VYSUNUT_M4_DEPTH)

    # Zkosení1
    zkosen_1_edges = [body_2.edges().sort_by_distance(p)[0] for p in [
        (-7.5, 16, 0),
        (-7.5, 14.8, 0),
    ]]
    chamfer(zkosen_1_edges, length=ZKOSEN_1_SIZE)

    # Sketch8 outside → Cut-Extrude2 (cut)
    with BuildSketch(Plane(origin=(0, 16, 0), x_dir=(1, 0, 0), z_dir=(0, 1, 0))):
        Rectangle(SKETCH8_OUTSIDE_W, SKETCH8_OUTSIDE_H)
        Circle(SKETCH8_OUTSIDE_R, mode=Mode.SUBTRACT)
    extrude(amount=-CUT_EXTRUDE2_DEPTH, mode=Mode.SUBTRACT)


with BuildPart() as body_3:
    # Skica6 → Přidat vysunutím5 (new body)
    with BuildSketch(Plane.XZ):
        Circle(SKICA6_R)
        Circle(SKICA6_R_2, mode=Mode.SUBTRACT)
    extrude(amount=-P_IDAT_VYSUNUT_M5_DEPTH)

    # Zkosení3
    zkosen_3_edges = [body_3.edges().sort_by_distance(p)[0] for p in [
        (-7.5, 0, 0),
        (-7.5, 7.8, 0),
    ]]
    chamfer(zkosen_3_edges, length=ZKOSEN_3_SIZE)

    # Sketch19 → Cut-Extrude6 (cut)
    with BuildSketch(Plane(origin=(0, 0, -7.5), x_dir=(-1, 0, 0), z_dir=(0, 0, -1))):
        with Locations((0, 3.9)):
            Circle(SKETCH19_R)
    extrude(amount=-CUT_EXTRUDE6_DEPTH, mode=Mode.SUBTRACT)

    # Sketch20 → Cut-Extrude7 (cut)
    with BuildSketch(Plane.ZY.offset(7.5)):
        with Locations((0, 3.9)):
            Circle(SKETCH20_R)
    extrude(amount=-CUT_EXTRUDE7_DEPTH, mode=Mode.SUBTRACT)


with BuildPart() as cut_extrude9_tool:
    # Sketch7 → Cut-Extrude9 (new body)
    with BuildSketch(Plane.XZ):
        Circle(SKETCH7_R)
    extrude(amount=-CUT_EXTRUDE9_DEPTH)


with BuildPart() as part_1:
    add(part.part)

    # Cut-Extrude9: cut by cut_extrude9_tool
    add(cut_extrude9_tool.part, mode=Mode.SUBTRACT)

    # Sketch27 → Cut-Extrude12 (cut)
    with BuildSketch(Plane(origin=(0, 7.8, 0), x_dir=(1, 0, 0), z_dir=(0, 1, 0))):
        Circle(SKETCH27_R)
    extrude(amount=CUT_EXTRUDE12_DEPTH, mode=Mode.SUBTRACT)


with BuildPart() as body_2_1:
    add(body_2.part)

    # Cut-Extrude9: cut by cut_extrude9_tool
    add(cut_extrude9_tool.part, mode=Mode.SUBTRACT)



with BuildPart() as body_3_1:
    add(body_3.part)

    # Cut-Extrude9: cut by cut_extrude9_tool
    add(cut_extrude9_tool.part, mode=Mode.SUBTRACT)


with BuildPart() as body_2_2:
    add(body_2_1.part)

    add(body_3_1.part)  # Boss-Extrude2 merges body 3
    # Sketch25 → Boss-Extrude2 (add)
    with BuildSketch(Plane(origin=(0, 7.8, 0), x_dir=(1, 0, 0), z_dir=(0, 1, 0))):
        with BuildLine():
            Line((-0.717938034, 6.096494849), (-0.907057907, 5.768929619))
            ThreePointArc((-0.907057907, 5.768929619), (-0.50810169, 4.942474166), (-1.423311217, 4.874752658))
            Line((-1.423311217, 4.874752658), (-1.918483232, 4.017089569))
            ThreePointArc((-1.918483232, 4.017089569), (-1.536908146, 3.193503192), (-2.440942413, 3.112163722))
            Line((-2.440942413, 3.112163722), (-2.91615597, 2.289069697))
            ThreePointArc((-2.91615597, 2.289069697), (-2.524743358, 1.463789867), (-3.435162962, 1.390123218))
            Line((-3.435162962, 1.390123218), (-3.927672168, 0.53707225))
            ThreePointArc((-3.927672168, 0.53707225), (-3.52415558, -0.290042476), (-4.442216238, -0.354144223))
            Line((-4.442216238, -0.354144223), (-4.911986074, -1.167809446))
            ThreePointArc((-4.911986074, -1.167809446), (-4.535840997, -1.990382794), (-5.436282951, -2.075918275))
            Line((-5.436282951, -2.075918275), (-5.898945462, -2.877273251))
            ThreePointArc((-5.898945462, -2.877273251), (-5.507068696, -3.176777484), (-5.508386199, -3.67))
            Line((-5.508386199, -3.67), (-4.536814361, -3.67))
            ThreePointArc((-4.536814361, -3.67), (-4.017748656, -2.91854188), (-3.49868295, -3.67))
            Line((-3.49868295, -3.67), (-2.520776964, -3.67))
            ThreePointArc((-2.520776964, -3.67), (-2.009979522, -2.897949376), (-1.499182081, -3.67))
            Line((-1.499182081, -3.67), (-0.513007831, -3.67))
            ThreePointArc((-0.513007831, -3.67), (-0.002210389, -2.897949376), (0.508587053, -3.67))
            Line((0.508587053, -3.67), (1.474168799, -3.67))
            ThreePointArc((1.474168799, -3.67), (1.98496624, -2.897949376), (2.495763682, -3.67))
            Line((2.495763682, -3.67), (3.518869287, -3.67))
            ThreePointArc((3.518869287, -3.67), (4.033920381, -2.908245628), (4.548971475, -3.67))
            Line((4.548971475, -3.67), (5.530558251, -3.67))
            ThreePointArc((5.530558251, -3.67), (5.556358411, -3.205925047), (5.92604395, -2.92420921))
            Line((5.92604395, -2.92420921), (5.4337836, -2.071589272))
            ThreePointArc((5.4337836, -2.071589272), (4.505290561, -2.021283953), (4.925971396, -1.192032735))
            Line((4.925971396, -1.192032735), (4.445945351, -0.360603235))
            ThreePointArc((4.445945351, -0.360603235), (3.569336636, -0.24921119), (3.911172652, 0.565650249))
            Line((3.911172652, 0.565650249), (3.418477875, 1.419022635))
            ThreePointArc((3.418477875, 1.419022635), (2.483630084, 1.460464645), (2.915164146, 2.290787587))
            Line((2.915164146, 2.290787587), (2.427366725, 3.135677503))
            ThreePointArc((2.427366725, 3.135677503), (1.503804697, 3.192615402), (1.916276044, 4.02091253))
            Line((1.916276044, 4.02091253), (1.436397938, 4.852085792))
            ThreePointArc((1.436397938, 4.852085792), (0.532106306, 4.93312138), (0.914073244, 5.7567787))
            Line((0.914073244, 5.7567787), (0.432060736, 6.591648854))
            ThreePointArc((0.432060736, 6.591648854), (0, 6.385), (-0.432060736, 6.591648854))
            Line((-0.432060736, 6.591648854), (-0.717938034, 6.096494849))
        make_face()
    extrude(amount=BOSS_EXTRUDE2_DEPTH)

    # Sketch28 → Cut-Extrude13 (cut)
    with BuildSketch(Plane(origin=(0, 16, 0), x_dir=(1, 0, 0), z_dir=(0, 1, 0))):
        Circle(SKETCH28_R)
    extrude(amount=-CUT_EXTRUDE13_DEPTH, mode=Mode.SUBTRACT)

    # Sketch30 → Cut-Extrude15 (cut)
    with BuildSketch(Plane.XZ):
        with Locations((5.232590181, -5.232590181)):
            Circle(SKETCH30_R)
    extrude(amount=-CUT_EXTRUDE15_DEPTH, mode=Mode.SUBTRACT)


solid = body_2_2.part
